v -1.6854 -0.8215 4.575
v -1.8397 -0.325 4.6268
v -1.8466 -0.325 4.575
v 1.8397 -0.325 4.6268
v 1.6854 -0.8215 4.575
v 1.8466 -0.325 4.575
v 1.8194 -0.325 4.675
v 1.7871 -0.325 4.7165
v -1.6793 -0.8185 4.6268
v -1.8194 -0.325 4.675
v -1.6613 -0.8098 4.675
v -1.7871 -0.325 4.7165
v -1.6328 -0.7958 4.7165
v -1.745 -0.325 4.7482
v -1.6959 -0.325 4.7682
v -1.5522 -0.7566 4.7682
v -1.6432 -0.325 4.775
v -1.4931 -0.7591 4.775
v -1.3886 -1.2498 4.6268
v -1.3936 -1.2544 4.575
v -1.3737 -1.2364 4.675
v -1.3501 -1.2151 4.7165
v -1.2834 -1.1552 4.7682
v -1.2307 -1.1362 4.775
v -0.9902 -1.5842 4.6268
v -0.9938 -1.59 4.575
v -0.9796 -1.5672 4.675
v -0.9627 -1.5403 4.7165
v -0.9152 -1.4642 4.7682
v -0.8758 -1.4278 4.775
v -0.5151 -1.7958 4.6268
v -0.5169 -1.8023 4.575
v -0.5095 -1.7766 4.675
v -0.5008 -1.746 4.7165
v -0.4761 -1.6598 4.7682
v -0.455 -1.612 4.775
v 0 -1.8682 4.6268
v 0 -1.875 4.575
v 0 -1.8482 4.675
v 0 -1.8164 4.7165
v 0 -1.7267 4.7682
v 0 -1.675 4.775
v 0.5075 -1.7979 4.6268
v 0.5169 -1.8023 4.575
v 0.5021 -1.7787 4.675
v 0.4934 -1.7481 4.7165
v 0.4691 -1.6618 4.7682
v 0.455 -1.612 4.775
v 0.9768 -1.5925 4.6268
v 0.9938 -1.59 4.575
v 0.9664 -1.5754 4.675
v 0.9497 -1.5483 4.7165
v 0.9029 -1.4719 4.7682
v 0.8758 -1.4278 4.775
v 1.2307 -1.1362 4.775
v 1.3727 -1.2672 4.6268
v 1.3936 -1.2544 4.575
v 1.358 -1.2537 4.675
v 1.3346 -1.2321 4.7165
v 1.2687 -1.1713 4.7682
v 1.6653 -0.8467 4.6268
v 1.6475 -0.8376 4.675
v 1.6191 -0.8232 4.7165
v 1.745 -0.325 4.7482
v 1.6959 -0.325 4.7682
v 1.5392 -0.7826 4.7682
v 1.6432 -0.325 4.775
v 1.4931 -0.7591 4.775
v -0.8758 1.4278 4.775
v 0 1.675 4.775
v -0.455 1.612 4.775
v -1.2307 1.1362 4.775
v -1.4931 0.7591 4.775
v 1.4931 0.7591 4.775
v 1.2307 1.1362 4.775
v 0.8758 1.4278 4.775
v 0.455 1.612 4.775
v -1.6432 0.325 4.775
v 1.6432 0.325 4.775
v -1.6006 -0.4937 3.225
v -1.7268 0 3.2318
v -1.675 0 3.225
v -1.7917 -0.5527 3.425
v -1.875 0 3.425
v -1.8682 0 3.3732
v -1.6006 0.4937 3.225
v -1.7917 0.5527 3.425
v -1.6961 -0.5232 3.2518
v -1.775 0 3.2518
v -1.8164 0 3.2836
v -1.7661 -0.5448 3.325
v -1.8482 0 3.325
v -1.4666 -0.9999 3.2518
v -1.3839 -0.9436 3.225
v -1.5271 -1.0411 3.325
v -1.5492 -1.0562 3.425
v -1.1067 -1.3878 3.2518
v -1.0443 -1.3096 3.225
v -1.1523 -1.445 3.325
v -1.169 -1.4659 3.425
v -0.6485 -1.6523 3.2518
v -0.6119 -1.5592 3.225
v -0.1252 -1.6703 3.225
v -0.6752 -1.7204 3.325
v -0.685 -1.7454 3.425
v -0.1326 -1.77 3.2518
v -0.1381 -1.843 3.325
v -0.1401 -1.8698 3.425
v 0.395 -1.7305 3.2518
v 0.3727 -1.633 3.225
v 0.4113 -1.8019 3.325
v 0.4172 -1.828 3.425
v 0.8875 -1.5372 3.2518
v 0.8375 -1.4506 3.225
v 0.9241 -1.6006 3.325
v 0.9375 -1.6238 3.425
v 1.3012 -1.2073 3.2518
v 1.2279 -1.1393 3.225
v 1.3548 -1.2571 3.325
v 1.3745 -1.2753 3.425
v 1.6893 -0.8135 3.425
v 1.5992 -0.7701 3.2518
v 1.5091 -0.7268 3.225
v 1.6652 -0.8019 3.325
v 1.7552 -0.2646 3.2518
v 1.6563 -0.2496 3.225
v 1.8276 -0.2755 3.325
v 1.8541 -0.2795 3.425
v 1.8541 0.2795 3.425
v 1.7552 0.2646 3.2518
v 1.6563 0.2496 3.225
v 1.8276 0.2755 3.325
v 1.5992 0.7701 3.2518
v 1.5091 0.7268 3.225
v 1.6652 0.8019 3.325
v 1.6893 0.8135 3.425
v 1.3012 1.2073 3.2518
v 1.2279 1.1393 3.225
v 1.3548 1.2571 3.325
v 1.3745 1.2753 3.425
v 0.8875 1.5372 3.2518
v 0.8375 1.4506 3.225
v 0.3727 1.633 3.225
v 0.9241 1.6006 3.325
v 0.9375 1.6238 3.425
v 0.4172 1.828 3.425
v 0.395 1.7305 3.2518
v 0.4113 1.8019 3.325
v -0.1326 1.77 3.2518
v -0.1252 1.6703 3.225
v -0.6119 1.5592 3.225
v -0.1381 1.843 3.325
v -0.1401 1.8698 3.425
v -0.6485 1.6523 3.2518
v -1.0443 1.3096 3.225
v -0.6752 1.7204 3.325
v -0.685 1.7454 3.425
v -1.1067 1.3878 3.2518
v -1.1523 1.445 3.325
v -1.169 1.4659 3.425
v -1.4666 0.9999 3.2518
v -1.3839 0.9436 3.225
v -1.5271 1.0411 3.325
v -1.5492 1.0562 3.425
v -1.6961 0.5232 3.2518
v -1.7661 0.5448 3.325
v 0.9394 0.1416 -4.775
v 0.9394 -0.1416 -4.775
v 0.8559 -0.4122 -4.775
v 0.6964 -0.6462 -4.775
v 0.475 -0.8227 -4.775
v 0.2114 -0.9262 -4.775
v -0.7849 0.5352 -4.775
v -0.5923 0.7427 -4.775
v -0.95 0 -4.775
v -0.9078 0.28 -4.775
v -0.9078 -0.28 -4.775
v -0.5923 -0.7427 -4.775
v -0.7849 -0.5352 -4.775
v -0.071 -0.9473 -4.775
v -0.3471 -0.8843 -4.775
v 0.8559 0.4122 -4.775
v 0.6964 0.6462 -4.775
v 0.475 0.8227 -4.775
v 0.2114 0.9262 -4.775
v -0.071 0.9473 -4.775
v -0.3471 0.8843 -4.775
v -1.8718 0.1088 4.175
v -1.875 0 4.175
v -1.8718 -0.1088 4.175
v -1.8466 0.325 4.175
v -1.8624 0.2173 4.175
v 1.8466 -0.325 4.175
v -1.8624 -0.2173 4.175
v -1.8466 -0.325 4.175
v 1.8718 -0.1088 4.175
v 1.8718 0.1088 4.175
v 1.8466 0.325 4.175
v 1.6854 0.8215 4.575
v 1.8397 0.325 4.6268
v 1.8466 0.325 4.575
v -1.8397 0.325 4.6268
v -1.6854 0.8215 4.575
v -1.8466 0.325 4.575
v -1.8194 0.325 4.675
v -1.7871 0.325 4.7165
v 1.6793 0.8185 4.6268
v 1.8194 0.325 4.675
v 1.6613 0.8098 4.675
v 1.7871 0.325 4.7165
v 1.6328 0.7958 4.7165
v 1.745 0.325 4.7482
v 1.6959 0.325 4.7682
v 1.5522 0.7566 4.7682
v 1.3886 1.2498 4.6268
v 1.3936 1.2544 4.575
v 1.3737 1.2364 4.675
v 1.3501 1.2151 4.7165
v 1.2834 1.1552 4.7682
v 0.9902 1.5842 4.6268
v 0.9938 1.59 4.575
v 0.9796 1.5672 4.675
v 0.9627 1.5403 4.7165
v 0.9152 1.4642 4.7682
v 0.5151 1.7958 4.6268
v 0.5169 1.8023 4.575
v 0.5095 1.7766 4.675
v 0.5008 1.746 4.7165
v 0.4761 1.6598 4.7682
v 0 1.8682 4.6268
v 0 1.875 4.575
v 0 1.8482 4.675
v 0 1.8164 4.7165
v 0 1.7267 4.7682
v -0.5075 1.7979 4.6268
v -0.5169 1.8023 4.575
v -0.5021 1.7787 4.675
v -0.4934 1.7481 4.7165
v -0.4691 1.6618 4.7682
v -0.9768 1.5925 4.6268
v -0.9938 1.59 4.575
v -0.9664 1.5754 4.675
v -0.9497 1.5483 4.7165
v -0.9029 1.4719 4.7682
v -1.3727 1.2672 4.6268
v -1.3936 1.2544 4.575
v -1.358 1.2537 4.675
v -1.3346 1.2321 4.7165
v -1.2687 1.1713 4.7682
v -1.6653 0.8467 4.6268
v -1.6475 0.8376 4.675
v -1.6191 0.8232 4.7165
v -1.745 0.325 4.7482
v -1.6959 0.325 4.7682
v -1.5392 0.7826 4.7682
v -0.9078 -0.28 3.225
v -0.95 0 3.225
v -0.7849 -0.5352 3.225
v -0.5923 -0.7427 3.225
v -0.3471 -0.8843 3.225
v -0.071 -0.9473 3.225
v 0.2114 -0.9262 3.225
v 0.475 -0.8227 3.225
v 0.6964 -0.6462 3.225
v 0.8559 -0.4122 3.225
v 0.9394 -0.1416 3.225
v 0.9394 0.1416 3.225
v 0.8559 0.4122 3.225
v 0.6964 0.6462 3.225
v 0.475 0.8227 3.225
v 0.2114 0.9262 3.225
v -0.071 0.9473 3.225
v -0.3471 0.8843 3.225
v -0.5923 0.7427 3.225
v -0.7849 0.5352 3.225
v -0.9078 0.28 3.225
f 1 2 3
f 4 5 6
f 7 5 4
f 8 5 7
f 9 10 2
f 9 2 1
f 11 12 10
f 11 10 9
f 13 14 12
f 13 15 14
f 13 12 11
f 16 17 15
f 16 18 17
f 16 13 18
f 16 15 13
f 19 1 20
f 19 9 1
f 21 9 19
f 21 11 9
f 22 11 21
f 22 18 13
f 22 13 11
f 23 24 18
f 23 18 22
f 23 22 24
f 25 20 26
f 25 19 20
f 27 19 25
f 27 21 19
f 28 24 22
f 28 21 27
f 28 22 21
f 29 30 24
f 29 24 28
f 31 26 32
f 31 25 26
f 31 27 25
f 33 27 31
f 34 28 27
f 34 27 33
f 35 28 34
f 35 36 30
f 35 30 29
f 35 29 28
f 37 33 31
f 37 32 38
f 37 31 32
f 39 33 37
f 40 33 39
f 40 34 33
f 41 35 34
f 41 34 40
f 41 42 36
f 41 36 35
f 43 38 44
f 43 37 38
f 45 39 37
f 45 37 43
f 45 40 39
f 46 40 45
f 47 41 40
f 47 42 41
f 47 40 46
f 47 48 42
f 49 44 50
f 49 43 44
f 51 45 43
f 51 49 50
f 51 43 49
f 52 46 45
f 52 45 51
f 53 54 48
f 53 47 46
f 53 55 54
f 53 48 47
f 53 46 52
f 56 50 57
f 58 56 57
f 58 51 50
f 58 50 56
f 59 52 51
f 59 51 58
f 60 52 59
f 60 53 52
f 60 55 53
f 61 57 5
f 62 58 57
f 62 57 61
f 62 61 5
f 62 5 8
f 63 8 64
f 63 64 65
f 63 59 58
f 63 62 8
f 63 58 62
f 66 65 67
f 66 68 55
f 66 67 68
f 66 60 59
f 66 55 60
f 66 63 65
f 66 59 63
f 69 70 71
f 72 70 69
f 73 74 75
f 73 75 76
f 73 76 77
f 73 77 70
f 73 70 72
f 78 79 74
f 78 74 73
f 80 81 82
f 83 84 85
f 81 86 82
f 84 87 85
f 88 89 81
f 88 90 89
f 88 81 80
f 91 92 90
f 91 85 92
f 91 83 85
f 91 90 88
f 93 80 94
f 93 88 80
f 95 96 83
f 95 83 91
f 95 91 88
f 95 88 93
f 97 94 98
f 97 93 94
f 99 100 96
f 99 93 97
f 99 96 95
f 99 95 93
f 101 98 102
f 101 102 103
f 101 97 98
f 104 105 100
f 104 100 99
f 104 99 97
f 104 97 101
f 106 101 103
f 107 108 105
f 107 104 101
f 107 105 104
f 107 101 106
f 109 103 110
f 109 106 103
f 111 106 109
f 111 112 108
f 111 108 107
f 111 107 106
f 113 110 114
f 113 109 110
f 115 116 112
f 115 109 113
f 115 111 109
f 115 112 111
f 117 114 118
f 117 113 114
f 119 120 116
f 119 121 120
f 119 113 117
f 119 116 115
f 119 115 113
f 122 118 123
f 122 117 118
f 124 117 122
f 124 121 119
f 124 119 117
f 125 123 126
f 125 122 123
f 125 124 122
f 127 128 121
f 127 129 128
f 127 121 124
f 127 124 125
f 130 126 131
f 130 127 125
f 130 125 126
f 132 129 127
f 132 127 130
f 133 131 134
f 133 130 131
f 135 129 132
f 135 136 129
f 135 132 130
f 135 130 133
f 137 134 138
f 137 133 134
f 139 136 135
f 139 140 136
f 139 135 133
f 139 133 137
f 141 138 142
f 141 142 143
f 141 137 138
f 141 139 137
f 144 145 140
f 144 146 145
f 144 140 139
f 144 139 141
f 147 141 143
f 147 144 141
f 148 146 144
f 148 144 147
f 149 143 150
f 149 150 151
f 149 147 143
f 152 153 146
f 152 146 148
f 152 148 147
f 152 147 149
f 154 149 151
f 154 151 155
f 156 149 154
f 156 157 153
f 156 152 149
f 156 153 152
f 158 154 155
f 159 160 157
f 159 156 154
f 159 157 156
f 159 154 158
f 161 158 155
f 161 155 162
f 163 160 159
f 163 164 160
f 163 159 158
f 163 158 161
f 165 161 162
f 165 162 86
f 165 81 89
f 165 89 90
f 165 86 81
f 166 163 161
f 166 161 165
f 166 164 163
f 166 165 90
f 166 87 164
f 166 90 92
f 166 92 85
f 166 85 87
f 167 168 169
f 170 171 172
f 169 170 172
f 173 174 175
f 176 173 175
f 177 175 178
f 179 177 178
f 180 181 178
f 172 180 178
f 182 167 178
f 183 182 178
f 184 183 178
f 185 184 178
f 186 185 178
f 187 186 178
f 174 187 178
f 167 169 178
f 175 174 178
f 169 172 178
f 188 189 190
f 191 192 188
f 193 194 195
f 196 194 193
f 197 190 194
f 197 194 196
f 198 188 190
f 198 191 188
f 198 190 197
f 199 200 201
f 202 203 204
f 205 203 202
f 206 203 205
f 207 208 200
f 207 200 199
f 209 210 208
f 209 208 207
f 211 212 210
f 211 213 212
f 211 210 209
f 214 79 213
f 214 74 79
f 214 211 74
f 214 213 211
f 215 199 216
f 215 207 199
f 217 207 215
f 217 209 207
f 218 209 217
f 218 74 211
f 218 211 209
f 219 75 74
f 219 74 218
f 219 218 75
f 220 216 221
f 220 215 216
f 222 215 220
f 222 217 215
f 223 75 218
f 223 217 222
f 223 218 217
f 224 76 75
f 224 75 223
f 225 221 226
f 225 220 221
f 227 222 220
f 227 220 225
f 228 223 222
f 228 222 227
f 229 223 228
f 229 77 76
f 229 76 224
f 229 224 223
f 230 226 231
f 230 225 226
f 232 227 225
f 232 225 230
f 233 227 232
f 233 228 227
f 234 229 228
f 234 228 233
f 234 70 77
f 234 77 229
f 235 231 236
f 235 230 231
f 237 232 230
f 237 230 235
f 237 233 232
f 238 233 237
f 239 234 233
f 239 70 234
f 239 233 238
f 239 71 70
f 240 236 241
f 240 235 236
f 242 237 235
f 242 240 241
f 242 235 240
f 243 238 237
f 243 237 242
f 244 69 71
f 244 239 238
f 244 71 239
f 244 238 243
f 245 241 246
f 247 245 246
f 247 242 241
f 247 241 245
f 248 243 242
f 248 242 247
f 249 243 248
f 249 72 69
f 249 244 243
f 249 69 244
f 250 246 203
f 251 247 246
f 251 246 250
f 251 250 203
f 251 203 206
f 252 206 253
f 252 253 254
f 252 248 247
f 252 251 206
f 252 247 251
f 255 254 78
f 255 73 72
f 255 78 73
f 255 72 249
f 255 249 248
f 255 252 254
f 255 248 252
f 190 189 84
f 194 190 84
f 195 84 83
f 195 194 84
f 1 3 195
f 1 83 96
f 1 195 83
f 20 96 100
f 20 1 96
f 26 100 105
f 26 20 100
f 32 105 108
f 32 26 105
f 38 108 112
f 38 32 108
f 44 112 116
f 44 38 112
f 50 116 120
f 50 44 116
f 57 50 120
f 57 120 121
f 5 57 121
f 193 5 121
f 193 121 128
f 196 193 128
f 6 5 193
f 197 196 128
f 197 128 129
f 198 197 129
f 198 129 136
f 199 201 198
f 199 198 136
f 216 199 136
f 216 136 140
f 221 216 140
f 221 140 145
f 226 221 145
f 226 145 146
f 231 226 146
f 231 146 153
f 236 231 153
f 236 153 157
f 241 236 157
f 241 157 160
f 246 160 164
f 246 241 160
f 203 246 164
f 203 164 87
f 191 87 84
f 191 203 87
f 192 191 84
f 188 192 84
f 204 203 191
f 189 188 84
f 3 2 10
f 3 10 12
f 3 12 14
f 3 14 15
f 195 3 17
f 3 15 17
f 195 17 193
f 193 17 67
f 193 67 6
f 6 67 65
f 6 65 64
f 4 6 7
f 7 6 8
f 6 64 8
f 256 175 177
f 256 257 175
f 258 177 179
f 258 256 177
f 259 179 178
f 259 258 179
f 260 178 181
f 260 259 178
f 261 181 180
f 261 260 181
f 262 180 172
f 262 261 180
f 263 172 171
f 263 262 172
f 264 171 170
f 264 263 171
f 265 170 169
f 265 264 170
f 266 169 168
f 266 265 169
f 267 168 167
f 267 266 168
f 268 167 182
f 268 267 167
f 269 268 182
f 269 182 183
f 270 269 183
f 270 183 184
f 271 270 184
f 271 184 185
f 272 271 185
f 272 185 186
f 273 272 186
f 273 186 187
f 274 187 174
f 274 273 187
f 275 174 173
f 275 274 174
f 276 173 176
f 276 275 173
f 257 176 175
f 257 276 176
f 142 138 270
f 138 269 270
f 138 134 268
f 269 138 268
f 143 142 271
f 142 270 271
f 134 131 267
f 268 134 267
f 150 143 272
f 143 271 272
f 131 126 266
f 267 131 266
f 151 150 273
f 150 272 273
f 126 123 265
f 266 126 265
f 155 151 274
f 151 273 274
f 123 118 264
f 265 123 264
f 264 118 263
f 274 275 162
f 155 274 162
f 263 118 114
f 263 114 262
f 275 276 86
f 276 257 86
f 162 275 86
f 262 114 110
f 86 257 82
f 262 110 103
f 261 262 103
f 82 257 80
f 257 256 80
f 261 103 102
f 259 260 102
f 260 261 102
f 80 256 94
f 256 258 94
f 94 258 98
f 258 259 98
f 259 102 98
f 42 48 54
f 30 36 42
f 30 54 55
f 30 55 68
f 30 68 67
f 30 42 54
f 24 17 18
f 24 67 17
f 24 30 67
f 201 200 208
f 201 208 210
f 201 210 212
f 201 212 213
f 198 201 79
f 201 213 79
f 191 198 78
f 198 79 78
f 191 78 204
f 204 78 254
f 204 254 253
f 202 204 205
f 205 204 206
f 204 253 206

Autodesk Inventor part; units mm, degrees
ref_plane "YZ Plane" through (0, 0, 0) normal (1, 0, 0) x (0, 1, 0)
ref_plane "XZ Plane" through (0, 0, 0) normal (0, 1, 0) x (-1, 0, 0)
ref_plane "XY Plane" through (0, 0, 0) normal (0, 0, 1) x (1, 0, 0)
sketch "Sketch1" plane through (0, 0, 0) normal (0, 1, 0) x (-1, 0, 0)
  line L0 (0, -6.685) -> (0, 6.685) projected
  line L1 (0, -4.775) -> (0, 4.775)
  line L2 (0, -4.775) -> (0.95, -4.775)
  line L3 (0.95, -4.775) -> (0.95, 3.225)
  line L4 (0.95, 3.225) -> (1.875, 3.225)
  line L5 (1.875, 3.225) -> (1.875, 4.775)
  line L6 (2.25, 0) -> (-0.375, 0) projected
  line L7 (0, 4.775) -> (1.875, 4.775)
  point P0 (0, 0)
  dimension "d0" = 8
  dimension "d1" = 1.9
  dimension "d3" = 3.75
  dimension "d4" = 1.55
revolve "Revolution1" add sketch "Sketch1" angle 360 about axis through (0, 0, -10) along (0, 0, 1)
thread "Thread2" size "M2x0.4" class "6g" standard "ANSI Metric M Profile" full length
fillet "Fillet1" radius 0.2 2 edges at (1.875, 0, 4.775) (1.875, 0, 3.225)
sketch "Sketch3" plane through (0, 0, 4.775) normal (0, 0, 1) x (1, 0, 0)
  circle A0 centre (0, 0) radius 1.875 projected
  circle A1 centre (0, 0) radius 1.875 projected
  line L0 (-2.5, -0.325) -> (2.5, -0.325)
  line L1 (2.5, -0.325) -> (2.5, 0.325)
  line L2 (2.5, 0.325) -> (-2.5, 0.325)
  line L3 (-2.5, 0.325) -> (-2.5, -0.325)
  line L4 (-2.5, -0.325) -> (2.5, 0.325) construction
  line L5 (2.5, -0.325) -> (-2.5, 0.325) construction
  dimension "d15" = 0.65
  dimension "d16" = 5
extrude "Extrusion2" cut sketch "Sketch3" against normal blind 0.6 contours A0 L0 L2 | A0 L2 L1 L0 | A0 L0 L3 L2
properties part number "empty"
